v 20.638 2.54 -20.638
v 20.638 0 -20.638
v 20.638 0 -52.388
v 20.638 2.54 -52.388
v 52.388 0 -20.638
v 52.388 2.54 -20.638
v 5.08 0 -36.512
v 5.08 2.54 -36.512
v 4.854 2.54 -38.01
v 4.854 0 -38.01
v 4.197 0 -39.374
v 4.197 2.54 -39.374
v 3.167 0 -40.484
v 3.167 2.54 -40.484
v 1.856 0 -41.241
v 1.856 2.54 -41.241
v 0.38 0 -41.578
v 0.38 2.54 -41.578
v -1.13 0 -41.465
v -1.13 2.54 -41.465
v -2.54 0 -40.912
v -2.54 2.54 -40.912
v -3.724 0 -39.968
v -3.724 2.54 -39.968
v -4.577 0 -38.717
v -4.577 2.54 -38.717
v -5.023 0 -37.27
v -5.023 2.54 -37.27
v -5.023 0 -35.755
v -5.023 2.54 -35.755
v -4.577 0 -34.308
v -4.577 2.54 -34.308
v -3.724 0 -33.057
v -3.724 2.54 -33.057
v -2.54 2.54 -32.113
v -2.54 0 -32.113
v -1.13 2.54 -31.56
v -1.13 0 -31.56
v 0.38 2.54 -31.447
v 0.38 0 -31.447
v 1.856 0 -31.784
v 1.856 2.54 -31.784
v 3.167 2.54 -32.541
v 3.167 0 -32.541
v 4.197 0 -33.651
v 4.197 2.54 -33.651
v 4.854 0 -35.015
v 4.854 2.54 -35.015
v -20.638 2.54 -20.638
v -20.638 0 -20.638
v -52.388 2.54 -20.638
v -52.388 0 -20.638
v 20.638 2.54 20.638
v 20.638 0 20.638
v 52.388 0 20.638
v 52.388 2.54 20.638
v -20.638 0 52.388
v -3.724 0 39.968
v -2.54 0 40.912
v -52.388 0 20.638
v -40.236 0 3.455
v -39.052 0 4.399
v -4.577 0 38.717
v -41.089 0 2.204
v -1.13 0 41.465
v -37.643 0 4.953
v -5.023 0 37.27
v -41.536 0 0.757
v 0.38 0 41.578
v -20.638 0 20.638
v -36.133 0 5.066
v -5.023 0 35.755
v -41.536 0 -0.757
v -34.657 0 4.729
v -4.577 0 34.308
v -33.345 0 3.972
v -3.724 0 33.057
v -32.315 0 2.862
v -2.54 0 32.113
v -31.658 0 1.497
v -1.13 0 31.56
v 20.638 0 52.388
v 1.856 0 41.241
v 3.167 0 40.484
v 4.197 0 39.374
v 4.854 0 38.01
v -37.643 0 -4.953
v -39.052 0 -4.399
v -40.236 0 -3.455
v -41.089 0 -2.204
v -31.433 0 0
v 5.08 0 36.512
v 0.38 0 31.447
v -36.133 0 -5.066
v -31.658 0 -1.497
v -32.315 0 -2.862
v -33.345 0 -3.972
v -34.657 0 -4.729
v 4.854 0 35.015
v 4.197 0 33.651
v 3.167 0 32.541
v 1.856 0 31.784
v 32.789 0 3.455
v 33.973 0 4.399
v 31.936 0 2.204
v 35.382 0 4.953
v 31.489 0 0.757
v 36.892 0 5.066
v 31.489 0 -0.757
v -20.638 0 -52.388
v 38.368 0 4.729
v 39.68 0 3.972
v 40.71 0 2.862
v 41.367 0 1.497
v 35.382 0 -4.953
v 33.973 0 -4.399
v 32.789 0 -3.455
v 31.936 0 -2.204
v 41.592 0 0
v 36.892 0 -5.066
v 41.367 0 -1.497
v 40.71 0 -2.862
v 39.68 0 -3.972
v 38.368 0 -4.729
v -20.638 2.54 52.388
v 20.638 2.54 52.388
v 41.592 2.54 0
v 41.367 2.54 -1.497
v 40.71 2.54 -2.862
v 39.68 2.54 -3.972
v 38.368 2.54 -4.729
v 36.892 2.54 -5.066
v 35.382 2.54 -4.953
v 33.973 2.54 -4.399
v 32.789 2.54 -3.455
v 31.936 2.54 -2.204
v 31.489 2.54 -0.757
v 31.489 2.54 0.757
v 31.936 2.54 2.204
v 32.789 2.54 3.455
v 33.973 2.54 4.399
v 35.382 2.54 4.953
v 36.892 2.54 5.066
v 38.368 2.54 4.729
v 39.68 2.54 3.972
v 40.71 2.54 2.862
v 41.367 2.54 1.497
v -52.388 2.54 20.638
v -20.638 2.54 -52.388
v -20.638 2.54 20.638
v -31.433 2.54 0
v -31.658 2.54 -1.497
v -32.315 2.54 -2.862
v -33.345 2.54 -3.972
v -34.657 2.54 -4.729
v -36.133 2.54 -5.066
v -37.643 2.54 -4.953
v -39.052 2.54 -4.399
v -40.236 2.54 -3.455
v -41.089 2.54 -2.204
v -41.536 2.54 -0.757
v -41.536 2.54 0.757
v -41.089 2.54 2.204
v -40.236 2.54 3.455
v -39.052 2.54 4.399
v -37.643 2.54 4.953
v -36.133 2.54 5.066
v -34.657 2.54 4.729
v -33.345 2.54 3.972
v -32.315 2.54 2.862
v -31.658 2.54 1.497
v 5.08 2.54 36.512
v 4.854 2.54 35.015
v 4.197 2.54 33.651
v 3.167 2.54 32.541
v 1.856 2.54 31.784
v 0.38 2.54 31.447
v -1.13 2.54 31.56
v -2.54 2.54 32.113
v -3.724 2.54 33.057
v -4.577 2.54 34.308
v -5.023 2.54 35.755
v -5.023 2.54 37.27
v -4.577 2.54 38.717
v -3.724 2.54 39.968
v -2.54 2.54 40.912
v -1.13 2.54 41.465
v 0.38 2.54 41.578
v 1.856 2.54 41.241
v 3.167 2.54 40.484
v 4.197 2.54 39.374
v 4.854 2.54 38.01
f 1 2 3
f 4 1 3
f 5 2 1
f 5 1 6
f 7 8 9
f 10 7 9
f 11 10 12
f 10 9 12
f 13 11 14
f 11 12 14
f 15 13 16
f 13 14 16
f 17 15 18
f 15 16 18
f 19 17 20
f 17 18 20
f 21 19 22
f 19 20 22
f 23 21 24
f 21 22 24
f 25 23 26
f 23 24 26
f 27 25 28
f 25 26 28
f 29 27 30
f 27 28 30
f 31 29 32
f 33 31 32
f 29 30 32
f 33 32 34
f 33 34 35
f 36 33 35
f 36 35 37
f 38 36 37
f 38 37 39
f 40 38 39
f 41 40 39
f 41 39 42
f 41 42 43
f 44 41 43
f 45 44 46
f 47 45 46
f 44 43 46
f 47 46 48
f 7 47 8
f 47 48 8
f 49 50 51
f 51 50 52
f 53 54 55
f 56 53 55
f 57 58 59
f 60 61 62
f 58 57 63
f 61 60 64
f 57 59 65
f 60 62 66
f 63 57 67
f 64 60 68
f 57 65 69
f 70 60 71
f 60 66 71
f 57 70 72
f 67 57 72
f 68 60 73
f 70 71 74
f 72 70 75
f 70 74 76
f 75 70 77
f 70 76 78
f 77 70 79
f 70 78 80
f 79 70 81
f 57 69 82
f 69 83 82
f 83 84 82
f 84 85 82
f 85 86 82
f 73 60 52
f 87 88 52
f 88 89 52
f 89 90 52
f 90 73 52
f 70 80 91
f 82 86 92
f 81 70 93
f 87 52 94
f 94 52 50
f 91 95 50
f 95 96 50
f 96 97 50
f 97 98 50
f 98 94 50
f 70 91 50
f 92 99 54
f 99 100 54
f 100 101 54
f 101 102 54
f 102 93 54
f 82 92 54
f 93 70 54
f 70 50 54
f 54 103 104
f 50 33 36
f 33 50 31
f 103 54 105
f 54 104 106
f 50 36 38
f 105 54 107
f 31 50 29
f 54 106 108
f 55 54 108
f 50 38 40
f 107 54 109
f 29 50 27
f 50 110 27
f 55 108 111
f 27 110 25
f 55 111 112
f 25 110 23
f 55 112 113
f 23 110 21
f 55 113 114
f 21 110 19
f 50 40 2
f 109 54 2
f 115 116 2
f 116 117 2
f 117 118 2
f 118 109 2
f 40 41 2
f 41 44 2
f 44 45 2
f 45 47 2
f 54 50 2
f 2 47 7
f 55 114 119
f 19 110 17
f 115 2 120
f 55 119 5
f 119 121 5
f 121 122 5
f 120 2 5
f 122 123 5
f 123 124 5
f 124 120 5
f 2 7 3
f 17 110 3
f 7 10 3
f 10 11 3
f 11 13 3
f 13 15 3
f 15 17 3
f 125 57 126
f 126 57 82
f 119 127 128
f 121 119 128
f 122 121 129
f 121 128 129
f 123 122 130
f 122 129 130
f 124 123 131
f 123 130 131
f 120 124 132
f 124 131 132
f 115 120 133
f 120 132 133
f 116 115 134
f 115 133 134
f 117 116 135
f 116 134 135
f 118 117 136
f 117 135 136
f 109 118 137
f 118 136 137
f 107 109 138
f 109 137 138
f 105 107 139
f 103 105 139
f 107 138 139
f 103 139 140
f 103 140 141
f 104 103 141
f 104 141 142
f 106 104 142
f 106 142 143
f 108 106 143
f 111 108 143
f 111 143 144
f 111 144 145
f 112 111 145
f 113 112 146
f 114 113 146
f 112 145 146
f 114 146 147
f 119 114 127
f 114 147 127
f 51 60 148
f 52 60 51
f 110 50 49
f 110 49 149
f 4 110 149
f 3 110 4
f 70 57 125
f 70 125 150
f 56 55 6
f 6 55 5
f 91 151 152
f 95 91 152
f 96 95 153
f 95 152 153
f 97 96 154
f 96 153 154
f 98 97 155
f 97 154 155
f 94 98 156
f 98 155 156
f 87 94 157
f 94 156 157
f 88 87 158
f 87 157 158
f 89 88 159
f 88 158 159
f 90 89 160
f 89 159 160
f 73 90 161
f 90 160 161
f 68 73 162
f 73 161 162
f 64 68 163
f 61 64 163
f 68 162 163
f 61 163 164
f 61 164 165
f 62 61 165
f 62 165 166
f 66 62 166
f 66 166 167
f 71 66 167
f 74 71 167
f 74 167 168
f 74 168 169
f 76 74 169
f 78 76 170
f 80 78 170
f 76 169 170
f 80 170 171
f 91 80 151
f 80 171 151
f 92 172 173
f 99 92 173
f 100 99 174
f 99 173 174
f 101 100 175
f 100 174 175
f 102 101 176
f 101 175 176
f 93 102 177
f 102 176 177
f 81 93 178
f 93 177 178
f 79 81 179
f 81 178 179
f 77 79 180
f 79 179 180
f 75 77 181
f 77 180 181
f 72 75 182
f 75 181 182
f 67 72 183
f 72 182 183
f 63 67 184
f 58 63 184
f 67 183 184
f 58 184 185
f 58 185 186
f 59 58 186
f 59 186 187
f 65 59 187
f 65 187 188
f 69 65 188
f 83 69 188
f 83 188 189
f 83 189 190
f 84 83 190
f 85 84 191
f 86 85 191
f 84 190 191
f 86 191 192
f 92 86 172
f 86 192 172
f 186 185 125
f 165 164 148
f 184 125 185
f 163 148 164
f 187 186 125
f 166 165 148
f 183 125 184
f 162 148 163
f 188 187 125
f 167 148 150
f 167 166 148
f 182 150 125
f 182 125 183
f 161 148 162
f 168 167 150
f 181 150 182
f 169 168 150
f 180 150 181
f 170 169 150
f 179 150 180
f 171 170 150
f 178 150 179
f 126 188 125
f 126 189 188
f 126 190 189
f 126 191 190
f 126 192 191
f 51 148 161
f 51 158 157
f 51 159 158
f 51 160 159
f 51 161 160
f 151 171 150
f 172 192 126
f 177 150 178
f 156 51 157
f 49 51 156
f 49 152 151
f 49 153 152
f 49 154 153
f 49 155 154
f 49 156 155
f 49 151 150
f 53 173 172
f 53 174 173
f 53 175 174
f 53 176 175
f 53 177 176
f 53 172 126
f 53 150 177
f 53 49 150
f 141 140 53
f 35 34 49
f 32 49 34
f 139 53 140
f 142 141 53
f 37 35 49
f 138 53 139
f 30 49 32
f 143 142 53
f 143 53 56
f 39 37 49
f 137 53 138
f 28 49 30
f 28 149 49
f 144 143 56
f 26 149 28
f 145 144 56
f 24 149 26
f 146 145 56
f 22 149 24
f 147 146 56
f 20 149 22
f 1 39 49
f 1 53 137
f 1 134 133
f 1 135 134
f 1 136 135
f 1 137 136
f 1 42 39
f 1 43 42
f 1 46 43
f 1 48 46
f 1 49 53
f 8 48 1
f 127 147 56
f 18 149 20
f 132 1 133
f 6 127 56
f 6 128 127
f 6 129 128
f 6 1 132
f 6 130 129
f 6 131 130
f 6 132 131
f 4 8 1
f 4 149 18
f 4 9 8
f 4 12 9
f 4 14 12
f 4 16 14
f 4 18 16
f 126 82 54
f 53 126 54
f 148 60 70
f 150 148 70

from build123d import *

# Parameters (mm, degrees)
SKETCH1_W           = 31.75
SKETCH1_H           = 41.275
SKETCH1_W_2         = 41.275
SKETCH1_H_2         = 31.75
BOSS_EXTRUDE1_DEPTH = 2.54
SKETCH2_R           = 5.08
CUT_EXTRUDE1_DEPTH  = 2.54


with BuildPart() as part:
    # Sketch1 → Boss-Extrude1 (new body)
    with BuildSketch(Plane(origin=(0, 0, 0), x_dir=(1, 0, 0), z_dir=(0, 1, 0))):
        with Locations((-36.5125, 0)):
            Rectangle(SKETCH1_W, SKETCH1_H)
        Rectangle(SKETCH1_W_2, SKETCH1_H)
        with Locations((0, -36.5125)):
            Rectangle(SKETCH1_W_2, SKETCH1_H_2)
        with Locations((0, 36.5125)):
            Rectangle(SKETCH1_W_2, SKETCH1_H_2)
        with Locations((36.5125, 0)):
            Rectangle(SKETCH1_W, SKETCH1_H)
    extrude(amount=BOSS_EXTRUDE1_DEPTH)

    # Sketch2 → Cut-Extrude1 (cut)
    with BuildSketch(Plane(origin=(0, 2.54, 0), x_dir=(1, 0, 0), z_dir=(0, 1, 0))):
        with Locations((0, -36.5125)):
            Circle(SKETCH2_R)
        with Locations((-36.5125, 0)):
            Circle(SKETCH2_R)
        with Locations((0, 36.5125)):
            Circle(SKETCH2_R)
        with Locations((36.5125, 0)):
            Circle(SKETCH2_R)
    extrude(amount=-CUT_EXTRUDE1_DEPTH, mode=Mode.SUBTRACT)


solid = part.part
